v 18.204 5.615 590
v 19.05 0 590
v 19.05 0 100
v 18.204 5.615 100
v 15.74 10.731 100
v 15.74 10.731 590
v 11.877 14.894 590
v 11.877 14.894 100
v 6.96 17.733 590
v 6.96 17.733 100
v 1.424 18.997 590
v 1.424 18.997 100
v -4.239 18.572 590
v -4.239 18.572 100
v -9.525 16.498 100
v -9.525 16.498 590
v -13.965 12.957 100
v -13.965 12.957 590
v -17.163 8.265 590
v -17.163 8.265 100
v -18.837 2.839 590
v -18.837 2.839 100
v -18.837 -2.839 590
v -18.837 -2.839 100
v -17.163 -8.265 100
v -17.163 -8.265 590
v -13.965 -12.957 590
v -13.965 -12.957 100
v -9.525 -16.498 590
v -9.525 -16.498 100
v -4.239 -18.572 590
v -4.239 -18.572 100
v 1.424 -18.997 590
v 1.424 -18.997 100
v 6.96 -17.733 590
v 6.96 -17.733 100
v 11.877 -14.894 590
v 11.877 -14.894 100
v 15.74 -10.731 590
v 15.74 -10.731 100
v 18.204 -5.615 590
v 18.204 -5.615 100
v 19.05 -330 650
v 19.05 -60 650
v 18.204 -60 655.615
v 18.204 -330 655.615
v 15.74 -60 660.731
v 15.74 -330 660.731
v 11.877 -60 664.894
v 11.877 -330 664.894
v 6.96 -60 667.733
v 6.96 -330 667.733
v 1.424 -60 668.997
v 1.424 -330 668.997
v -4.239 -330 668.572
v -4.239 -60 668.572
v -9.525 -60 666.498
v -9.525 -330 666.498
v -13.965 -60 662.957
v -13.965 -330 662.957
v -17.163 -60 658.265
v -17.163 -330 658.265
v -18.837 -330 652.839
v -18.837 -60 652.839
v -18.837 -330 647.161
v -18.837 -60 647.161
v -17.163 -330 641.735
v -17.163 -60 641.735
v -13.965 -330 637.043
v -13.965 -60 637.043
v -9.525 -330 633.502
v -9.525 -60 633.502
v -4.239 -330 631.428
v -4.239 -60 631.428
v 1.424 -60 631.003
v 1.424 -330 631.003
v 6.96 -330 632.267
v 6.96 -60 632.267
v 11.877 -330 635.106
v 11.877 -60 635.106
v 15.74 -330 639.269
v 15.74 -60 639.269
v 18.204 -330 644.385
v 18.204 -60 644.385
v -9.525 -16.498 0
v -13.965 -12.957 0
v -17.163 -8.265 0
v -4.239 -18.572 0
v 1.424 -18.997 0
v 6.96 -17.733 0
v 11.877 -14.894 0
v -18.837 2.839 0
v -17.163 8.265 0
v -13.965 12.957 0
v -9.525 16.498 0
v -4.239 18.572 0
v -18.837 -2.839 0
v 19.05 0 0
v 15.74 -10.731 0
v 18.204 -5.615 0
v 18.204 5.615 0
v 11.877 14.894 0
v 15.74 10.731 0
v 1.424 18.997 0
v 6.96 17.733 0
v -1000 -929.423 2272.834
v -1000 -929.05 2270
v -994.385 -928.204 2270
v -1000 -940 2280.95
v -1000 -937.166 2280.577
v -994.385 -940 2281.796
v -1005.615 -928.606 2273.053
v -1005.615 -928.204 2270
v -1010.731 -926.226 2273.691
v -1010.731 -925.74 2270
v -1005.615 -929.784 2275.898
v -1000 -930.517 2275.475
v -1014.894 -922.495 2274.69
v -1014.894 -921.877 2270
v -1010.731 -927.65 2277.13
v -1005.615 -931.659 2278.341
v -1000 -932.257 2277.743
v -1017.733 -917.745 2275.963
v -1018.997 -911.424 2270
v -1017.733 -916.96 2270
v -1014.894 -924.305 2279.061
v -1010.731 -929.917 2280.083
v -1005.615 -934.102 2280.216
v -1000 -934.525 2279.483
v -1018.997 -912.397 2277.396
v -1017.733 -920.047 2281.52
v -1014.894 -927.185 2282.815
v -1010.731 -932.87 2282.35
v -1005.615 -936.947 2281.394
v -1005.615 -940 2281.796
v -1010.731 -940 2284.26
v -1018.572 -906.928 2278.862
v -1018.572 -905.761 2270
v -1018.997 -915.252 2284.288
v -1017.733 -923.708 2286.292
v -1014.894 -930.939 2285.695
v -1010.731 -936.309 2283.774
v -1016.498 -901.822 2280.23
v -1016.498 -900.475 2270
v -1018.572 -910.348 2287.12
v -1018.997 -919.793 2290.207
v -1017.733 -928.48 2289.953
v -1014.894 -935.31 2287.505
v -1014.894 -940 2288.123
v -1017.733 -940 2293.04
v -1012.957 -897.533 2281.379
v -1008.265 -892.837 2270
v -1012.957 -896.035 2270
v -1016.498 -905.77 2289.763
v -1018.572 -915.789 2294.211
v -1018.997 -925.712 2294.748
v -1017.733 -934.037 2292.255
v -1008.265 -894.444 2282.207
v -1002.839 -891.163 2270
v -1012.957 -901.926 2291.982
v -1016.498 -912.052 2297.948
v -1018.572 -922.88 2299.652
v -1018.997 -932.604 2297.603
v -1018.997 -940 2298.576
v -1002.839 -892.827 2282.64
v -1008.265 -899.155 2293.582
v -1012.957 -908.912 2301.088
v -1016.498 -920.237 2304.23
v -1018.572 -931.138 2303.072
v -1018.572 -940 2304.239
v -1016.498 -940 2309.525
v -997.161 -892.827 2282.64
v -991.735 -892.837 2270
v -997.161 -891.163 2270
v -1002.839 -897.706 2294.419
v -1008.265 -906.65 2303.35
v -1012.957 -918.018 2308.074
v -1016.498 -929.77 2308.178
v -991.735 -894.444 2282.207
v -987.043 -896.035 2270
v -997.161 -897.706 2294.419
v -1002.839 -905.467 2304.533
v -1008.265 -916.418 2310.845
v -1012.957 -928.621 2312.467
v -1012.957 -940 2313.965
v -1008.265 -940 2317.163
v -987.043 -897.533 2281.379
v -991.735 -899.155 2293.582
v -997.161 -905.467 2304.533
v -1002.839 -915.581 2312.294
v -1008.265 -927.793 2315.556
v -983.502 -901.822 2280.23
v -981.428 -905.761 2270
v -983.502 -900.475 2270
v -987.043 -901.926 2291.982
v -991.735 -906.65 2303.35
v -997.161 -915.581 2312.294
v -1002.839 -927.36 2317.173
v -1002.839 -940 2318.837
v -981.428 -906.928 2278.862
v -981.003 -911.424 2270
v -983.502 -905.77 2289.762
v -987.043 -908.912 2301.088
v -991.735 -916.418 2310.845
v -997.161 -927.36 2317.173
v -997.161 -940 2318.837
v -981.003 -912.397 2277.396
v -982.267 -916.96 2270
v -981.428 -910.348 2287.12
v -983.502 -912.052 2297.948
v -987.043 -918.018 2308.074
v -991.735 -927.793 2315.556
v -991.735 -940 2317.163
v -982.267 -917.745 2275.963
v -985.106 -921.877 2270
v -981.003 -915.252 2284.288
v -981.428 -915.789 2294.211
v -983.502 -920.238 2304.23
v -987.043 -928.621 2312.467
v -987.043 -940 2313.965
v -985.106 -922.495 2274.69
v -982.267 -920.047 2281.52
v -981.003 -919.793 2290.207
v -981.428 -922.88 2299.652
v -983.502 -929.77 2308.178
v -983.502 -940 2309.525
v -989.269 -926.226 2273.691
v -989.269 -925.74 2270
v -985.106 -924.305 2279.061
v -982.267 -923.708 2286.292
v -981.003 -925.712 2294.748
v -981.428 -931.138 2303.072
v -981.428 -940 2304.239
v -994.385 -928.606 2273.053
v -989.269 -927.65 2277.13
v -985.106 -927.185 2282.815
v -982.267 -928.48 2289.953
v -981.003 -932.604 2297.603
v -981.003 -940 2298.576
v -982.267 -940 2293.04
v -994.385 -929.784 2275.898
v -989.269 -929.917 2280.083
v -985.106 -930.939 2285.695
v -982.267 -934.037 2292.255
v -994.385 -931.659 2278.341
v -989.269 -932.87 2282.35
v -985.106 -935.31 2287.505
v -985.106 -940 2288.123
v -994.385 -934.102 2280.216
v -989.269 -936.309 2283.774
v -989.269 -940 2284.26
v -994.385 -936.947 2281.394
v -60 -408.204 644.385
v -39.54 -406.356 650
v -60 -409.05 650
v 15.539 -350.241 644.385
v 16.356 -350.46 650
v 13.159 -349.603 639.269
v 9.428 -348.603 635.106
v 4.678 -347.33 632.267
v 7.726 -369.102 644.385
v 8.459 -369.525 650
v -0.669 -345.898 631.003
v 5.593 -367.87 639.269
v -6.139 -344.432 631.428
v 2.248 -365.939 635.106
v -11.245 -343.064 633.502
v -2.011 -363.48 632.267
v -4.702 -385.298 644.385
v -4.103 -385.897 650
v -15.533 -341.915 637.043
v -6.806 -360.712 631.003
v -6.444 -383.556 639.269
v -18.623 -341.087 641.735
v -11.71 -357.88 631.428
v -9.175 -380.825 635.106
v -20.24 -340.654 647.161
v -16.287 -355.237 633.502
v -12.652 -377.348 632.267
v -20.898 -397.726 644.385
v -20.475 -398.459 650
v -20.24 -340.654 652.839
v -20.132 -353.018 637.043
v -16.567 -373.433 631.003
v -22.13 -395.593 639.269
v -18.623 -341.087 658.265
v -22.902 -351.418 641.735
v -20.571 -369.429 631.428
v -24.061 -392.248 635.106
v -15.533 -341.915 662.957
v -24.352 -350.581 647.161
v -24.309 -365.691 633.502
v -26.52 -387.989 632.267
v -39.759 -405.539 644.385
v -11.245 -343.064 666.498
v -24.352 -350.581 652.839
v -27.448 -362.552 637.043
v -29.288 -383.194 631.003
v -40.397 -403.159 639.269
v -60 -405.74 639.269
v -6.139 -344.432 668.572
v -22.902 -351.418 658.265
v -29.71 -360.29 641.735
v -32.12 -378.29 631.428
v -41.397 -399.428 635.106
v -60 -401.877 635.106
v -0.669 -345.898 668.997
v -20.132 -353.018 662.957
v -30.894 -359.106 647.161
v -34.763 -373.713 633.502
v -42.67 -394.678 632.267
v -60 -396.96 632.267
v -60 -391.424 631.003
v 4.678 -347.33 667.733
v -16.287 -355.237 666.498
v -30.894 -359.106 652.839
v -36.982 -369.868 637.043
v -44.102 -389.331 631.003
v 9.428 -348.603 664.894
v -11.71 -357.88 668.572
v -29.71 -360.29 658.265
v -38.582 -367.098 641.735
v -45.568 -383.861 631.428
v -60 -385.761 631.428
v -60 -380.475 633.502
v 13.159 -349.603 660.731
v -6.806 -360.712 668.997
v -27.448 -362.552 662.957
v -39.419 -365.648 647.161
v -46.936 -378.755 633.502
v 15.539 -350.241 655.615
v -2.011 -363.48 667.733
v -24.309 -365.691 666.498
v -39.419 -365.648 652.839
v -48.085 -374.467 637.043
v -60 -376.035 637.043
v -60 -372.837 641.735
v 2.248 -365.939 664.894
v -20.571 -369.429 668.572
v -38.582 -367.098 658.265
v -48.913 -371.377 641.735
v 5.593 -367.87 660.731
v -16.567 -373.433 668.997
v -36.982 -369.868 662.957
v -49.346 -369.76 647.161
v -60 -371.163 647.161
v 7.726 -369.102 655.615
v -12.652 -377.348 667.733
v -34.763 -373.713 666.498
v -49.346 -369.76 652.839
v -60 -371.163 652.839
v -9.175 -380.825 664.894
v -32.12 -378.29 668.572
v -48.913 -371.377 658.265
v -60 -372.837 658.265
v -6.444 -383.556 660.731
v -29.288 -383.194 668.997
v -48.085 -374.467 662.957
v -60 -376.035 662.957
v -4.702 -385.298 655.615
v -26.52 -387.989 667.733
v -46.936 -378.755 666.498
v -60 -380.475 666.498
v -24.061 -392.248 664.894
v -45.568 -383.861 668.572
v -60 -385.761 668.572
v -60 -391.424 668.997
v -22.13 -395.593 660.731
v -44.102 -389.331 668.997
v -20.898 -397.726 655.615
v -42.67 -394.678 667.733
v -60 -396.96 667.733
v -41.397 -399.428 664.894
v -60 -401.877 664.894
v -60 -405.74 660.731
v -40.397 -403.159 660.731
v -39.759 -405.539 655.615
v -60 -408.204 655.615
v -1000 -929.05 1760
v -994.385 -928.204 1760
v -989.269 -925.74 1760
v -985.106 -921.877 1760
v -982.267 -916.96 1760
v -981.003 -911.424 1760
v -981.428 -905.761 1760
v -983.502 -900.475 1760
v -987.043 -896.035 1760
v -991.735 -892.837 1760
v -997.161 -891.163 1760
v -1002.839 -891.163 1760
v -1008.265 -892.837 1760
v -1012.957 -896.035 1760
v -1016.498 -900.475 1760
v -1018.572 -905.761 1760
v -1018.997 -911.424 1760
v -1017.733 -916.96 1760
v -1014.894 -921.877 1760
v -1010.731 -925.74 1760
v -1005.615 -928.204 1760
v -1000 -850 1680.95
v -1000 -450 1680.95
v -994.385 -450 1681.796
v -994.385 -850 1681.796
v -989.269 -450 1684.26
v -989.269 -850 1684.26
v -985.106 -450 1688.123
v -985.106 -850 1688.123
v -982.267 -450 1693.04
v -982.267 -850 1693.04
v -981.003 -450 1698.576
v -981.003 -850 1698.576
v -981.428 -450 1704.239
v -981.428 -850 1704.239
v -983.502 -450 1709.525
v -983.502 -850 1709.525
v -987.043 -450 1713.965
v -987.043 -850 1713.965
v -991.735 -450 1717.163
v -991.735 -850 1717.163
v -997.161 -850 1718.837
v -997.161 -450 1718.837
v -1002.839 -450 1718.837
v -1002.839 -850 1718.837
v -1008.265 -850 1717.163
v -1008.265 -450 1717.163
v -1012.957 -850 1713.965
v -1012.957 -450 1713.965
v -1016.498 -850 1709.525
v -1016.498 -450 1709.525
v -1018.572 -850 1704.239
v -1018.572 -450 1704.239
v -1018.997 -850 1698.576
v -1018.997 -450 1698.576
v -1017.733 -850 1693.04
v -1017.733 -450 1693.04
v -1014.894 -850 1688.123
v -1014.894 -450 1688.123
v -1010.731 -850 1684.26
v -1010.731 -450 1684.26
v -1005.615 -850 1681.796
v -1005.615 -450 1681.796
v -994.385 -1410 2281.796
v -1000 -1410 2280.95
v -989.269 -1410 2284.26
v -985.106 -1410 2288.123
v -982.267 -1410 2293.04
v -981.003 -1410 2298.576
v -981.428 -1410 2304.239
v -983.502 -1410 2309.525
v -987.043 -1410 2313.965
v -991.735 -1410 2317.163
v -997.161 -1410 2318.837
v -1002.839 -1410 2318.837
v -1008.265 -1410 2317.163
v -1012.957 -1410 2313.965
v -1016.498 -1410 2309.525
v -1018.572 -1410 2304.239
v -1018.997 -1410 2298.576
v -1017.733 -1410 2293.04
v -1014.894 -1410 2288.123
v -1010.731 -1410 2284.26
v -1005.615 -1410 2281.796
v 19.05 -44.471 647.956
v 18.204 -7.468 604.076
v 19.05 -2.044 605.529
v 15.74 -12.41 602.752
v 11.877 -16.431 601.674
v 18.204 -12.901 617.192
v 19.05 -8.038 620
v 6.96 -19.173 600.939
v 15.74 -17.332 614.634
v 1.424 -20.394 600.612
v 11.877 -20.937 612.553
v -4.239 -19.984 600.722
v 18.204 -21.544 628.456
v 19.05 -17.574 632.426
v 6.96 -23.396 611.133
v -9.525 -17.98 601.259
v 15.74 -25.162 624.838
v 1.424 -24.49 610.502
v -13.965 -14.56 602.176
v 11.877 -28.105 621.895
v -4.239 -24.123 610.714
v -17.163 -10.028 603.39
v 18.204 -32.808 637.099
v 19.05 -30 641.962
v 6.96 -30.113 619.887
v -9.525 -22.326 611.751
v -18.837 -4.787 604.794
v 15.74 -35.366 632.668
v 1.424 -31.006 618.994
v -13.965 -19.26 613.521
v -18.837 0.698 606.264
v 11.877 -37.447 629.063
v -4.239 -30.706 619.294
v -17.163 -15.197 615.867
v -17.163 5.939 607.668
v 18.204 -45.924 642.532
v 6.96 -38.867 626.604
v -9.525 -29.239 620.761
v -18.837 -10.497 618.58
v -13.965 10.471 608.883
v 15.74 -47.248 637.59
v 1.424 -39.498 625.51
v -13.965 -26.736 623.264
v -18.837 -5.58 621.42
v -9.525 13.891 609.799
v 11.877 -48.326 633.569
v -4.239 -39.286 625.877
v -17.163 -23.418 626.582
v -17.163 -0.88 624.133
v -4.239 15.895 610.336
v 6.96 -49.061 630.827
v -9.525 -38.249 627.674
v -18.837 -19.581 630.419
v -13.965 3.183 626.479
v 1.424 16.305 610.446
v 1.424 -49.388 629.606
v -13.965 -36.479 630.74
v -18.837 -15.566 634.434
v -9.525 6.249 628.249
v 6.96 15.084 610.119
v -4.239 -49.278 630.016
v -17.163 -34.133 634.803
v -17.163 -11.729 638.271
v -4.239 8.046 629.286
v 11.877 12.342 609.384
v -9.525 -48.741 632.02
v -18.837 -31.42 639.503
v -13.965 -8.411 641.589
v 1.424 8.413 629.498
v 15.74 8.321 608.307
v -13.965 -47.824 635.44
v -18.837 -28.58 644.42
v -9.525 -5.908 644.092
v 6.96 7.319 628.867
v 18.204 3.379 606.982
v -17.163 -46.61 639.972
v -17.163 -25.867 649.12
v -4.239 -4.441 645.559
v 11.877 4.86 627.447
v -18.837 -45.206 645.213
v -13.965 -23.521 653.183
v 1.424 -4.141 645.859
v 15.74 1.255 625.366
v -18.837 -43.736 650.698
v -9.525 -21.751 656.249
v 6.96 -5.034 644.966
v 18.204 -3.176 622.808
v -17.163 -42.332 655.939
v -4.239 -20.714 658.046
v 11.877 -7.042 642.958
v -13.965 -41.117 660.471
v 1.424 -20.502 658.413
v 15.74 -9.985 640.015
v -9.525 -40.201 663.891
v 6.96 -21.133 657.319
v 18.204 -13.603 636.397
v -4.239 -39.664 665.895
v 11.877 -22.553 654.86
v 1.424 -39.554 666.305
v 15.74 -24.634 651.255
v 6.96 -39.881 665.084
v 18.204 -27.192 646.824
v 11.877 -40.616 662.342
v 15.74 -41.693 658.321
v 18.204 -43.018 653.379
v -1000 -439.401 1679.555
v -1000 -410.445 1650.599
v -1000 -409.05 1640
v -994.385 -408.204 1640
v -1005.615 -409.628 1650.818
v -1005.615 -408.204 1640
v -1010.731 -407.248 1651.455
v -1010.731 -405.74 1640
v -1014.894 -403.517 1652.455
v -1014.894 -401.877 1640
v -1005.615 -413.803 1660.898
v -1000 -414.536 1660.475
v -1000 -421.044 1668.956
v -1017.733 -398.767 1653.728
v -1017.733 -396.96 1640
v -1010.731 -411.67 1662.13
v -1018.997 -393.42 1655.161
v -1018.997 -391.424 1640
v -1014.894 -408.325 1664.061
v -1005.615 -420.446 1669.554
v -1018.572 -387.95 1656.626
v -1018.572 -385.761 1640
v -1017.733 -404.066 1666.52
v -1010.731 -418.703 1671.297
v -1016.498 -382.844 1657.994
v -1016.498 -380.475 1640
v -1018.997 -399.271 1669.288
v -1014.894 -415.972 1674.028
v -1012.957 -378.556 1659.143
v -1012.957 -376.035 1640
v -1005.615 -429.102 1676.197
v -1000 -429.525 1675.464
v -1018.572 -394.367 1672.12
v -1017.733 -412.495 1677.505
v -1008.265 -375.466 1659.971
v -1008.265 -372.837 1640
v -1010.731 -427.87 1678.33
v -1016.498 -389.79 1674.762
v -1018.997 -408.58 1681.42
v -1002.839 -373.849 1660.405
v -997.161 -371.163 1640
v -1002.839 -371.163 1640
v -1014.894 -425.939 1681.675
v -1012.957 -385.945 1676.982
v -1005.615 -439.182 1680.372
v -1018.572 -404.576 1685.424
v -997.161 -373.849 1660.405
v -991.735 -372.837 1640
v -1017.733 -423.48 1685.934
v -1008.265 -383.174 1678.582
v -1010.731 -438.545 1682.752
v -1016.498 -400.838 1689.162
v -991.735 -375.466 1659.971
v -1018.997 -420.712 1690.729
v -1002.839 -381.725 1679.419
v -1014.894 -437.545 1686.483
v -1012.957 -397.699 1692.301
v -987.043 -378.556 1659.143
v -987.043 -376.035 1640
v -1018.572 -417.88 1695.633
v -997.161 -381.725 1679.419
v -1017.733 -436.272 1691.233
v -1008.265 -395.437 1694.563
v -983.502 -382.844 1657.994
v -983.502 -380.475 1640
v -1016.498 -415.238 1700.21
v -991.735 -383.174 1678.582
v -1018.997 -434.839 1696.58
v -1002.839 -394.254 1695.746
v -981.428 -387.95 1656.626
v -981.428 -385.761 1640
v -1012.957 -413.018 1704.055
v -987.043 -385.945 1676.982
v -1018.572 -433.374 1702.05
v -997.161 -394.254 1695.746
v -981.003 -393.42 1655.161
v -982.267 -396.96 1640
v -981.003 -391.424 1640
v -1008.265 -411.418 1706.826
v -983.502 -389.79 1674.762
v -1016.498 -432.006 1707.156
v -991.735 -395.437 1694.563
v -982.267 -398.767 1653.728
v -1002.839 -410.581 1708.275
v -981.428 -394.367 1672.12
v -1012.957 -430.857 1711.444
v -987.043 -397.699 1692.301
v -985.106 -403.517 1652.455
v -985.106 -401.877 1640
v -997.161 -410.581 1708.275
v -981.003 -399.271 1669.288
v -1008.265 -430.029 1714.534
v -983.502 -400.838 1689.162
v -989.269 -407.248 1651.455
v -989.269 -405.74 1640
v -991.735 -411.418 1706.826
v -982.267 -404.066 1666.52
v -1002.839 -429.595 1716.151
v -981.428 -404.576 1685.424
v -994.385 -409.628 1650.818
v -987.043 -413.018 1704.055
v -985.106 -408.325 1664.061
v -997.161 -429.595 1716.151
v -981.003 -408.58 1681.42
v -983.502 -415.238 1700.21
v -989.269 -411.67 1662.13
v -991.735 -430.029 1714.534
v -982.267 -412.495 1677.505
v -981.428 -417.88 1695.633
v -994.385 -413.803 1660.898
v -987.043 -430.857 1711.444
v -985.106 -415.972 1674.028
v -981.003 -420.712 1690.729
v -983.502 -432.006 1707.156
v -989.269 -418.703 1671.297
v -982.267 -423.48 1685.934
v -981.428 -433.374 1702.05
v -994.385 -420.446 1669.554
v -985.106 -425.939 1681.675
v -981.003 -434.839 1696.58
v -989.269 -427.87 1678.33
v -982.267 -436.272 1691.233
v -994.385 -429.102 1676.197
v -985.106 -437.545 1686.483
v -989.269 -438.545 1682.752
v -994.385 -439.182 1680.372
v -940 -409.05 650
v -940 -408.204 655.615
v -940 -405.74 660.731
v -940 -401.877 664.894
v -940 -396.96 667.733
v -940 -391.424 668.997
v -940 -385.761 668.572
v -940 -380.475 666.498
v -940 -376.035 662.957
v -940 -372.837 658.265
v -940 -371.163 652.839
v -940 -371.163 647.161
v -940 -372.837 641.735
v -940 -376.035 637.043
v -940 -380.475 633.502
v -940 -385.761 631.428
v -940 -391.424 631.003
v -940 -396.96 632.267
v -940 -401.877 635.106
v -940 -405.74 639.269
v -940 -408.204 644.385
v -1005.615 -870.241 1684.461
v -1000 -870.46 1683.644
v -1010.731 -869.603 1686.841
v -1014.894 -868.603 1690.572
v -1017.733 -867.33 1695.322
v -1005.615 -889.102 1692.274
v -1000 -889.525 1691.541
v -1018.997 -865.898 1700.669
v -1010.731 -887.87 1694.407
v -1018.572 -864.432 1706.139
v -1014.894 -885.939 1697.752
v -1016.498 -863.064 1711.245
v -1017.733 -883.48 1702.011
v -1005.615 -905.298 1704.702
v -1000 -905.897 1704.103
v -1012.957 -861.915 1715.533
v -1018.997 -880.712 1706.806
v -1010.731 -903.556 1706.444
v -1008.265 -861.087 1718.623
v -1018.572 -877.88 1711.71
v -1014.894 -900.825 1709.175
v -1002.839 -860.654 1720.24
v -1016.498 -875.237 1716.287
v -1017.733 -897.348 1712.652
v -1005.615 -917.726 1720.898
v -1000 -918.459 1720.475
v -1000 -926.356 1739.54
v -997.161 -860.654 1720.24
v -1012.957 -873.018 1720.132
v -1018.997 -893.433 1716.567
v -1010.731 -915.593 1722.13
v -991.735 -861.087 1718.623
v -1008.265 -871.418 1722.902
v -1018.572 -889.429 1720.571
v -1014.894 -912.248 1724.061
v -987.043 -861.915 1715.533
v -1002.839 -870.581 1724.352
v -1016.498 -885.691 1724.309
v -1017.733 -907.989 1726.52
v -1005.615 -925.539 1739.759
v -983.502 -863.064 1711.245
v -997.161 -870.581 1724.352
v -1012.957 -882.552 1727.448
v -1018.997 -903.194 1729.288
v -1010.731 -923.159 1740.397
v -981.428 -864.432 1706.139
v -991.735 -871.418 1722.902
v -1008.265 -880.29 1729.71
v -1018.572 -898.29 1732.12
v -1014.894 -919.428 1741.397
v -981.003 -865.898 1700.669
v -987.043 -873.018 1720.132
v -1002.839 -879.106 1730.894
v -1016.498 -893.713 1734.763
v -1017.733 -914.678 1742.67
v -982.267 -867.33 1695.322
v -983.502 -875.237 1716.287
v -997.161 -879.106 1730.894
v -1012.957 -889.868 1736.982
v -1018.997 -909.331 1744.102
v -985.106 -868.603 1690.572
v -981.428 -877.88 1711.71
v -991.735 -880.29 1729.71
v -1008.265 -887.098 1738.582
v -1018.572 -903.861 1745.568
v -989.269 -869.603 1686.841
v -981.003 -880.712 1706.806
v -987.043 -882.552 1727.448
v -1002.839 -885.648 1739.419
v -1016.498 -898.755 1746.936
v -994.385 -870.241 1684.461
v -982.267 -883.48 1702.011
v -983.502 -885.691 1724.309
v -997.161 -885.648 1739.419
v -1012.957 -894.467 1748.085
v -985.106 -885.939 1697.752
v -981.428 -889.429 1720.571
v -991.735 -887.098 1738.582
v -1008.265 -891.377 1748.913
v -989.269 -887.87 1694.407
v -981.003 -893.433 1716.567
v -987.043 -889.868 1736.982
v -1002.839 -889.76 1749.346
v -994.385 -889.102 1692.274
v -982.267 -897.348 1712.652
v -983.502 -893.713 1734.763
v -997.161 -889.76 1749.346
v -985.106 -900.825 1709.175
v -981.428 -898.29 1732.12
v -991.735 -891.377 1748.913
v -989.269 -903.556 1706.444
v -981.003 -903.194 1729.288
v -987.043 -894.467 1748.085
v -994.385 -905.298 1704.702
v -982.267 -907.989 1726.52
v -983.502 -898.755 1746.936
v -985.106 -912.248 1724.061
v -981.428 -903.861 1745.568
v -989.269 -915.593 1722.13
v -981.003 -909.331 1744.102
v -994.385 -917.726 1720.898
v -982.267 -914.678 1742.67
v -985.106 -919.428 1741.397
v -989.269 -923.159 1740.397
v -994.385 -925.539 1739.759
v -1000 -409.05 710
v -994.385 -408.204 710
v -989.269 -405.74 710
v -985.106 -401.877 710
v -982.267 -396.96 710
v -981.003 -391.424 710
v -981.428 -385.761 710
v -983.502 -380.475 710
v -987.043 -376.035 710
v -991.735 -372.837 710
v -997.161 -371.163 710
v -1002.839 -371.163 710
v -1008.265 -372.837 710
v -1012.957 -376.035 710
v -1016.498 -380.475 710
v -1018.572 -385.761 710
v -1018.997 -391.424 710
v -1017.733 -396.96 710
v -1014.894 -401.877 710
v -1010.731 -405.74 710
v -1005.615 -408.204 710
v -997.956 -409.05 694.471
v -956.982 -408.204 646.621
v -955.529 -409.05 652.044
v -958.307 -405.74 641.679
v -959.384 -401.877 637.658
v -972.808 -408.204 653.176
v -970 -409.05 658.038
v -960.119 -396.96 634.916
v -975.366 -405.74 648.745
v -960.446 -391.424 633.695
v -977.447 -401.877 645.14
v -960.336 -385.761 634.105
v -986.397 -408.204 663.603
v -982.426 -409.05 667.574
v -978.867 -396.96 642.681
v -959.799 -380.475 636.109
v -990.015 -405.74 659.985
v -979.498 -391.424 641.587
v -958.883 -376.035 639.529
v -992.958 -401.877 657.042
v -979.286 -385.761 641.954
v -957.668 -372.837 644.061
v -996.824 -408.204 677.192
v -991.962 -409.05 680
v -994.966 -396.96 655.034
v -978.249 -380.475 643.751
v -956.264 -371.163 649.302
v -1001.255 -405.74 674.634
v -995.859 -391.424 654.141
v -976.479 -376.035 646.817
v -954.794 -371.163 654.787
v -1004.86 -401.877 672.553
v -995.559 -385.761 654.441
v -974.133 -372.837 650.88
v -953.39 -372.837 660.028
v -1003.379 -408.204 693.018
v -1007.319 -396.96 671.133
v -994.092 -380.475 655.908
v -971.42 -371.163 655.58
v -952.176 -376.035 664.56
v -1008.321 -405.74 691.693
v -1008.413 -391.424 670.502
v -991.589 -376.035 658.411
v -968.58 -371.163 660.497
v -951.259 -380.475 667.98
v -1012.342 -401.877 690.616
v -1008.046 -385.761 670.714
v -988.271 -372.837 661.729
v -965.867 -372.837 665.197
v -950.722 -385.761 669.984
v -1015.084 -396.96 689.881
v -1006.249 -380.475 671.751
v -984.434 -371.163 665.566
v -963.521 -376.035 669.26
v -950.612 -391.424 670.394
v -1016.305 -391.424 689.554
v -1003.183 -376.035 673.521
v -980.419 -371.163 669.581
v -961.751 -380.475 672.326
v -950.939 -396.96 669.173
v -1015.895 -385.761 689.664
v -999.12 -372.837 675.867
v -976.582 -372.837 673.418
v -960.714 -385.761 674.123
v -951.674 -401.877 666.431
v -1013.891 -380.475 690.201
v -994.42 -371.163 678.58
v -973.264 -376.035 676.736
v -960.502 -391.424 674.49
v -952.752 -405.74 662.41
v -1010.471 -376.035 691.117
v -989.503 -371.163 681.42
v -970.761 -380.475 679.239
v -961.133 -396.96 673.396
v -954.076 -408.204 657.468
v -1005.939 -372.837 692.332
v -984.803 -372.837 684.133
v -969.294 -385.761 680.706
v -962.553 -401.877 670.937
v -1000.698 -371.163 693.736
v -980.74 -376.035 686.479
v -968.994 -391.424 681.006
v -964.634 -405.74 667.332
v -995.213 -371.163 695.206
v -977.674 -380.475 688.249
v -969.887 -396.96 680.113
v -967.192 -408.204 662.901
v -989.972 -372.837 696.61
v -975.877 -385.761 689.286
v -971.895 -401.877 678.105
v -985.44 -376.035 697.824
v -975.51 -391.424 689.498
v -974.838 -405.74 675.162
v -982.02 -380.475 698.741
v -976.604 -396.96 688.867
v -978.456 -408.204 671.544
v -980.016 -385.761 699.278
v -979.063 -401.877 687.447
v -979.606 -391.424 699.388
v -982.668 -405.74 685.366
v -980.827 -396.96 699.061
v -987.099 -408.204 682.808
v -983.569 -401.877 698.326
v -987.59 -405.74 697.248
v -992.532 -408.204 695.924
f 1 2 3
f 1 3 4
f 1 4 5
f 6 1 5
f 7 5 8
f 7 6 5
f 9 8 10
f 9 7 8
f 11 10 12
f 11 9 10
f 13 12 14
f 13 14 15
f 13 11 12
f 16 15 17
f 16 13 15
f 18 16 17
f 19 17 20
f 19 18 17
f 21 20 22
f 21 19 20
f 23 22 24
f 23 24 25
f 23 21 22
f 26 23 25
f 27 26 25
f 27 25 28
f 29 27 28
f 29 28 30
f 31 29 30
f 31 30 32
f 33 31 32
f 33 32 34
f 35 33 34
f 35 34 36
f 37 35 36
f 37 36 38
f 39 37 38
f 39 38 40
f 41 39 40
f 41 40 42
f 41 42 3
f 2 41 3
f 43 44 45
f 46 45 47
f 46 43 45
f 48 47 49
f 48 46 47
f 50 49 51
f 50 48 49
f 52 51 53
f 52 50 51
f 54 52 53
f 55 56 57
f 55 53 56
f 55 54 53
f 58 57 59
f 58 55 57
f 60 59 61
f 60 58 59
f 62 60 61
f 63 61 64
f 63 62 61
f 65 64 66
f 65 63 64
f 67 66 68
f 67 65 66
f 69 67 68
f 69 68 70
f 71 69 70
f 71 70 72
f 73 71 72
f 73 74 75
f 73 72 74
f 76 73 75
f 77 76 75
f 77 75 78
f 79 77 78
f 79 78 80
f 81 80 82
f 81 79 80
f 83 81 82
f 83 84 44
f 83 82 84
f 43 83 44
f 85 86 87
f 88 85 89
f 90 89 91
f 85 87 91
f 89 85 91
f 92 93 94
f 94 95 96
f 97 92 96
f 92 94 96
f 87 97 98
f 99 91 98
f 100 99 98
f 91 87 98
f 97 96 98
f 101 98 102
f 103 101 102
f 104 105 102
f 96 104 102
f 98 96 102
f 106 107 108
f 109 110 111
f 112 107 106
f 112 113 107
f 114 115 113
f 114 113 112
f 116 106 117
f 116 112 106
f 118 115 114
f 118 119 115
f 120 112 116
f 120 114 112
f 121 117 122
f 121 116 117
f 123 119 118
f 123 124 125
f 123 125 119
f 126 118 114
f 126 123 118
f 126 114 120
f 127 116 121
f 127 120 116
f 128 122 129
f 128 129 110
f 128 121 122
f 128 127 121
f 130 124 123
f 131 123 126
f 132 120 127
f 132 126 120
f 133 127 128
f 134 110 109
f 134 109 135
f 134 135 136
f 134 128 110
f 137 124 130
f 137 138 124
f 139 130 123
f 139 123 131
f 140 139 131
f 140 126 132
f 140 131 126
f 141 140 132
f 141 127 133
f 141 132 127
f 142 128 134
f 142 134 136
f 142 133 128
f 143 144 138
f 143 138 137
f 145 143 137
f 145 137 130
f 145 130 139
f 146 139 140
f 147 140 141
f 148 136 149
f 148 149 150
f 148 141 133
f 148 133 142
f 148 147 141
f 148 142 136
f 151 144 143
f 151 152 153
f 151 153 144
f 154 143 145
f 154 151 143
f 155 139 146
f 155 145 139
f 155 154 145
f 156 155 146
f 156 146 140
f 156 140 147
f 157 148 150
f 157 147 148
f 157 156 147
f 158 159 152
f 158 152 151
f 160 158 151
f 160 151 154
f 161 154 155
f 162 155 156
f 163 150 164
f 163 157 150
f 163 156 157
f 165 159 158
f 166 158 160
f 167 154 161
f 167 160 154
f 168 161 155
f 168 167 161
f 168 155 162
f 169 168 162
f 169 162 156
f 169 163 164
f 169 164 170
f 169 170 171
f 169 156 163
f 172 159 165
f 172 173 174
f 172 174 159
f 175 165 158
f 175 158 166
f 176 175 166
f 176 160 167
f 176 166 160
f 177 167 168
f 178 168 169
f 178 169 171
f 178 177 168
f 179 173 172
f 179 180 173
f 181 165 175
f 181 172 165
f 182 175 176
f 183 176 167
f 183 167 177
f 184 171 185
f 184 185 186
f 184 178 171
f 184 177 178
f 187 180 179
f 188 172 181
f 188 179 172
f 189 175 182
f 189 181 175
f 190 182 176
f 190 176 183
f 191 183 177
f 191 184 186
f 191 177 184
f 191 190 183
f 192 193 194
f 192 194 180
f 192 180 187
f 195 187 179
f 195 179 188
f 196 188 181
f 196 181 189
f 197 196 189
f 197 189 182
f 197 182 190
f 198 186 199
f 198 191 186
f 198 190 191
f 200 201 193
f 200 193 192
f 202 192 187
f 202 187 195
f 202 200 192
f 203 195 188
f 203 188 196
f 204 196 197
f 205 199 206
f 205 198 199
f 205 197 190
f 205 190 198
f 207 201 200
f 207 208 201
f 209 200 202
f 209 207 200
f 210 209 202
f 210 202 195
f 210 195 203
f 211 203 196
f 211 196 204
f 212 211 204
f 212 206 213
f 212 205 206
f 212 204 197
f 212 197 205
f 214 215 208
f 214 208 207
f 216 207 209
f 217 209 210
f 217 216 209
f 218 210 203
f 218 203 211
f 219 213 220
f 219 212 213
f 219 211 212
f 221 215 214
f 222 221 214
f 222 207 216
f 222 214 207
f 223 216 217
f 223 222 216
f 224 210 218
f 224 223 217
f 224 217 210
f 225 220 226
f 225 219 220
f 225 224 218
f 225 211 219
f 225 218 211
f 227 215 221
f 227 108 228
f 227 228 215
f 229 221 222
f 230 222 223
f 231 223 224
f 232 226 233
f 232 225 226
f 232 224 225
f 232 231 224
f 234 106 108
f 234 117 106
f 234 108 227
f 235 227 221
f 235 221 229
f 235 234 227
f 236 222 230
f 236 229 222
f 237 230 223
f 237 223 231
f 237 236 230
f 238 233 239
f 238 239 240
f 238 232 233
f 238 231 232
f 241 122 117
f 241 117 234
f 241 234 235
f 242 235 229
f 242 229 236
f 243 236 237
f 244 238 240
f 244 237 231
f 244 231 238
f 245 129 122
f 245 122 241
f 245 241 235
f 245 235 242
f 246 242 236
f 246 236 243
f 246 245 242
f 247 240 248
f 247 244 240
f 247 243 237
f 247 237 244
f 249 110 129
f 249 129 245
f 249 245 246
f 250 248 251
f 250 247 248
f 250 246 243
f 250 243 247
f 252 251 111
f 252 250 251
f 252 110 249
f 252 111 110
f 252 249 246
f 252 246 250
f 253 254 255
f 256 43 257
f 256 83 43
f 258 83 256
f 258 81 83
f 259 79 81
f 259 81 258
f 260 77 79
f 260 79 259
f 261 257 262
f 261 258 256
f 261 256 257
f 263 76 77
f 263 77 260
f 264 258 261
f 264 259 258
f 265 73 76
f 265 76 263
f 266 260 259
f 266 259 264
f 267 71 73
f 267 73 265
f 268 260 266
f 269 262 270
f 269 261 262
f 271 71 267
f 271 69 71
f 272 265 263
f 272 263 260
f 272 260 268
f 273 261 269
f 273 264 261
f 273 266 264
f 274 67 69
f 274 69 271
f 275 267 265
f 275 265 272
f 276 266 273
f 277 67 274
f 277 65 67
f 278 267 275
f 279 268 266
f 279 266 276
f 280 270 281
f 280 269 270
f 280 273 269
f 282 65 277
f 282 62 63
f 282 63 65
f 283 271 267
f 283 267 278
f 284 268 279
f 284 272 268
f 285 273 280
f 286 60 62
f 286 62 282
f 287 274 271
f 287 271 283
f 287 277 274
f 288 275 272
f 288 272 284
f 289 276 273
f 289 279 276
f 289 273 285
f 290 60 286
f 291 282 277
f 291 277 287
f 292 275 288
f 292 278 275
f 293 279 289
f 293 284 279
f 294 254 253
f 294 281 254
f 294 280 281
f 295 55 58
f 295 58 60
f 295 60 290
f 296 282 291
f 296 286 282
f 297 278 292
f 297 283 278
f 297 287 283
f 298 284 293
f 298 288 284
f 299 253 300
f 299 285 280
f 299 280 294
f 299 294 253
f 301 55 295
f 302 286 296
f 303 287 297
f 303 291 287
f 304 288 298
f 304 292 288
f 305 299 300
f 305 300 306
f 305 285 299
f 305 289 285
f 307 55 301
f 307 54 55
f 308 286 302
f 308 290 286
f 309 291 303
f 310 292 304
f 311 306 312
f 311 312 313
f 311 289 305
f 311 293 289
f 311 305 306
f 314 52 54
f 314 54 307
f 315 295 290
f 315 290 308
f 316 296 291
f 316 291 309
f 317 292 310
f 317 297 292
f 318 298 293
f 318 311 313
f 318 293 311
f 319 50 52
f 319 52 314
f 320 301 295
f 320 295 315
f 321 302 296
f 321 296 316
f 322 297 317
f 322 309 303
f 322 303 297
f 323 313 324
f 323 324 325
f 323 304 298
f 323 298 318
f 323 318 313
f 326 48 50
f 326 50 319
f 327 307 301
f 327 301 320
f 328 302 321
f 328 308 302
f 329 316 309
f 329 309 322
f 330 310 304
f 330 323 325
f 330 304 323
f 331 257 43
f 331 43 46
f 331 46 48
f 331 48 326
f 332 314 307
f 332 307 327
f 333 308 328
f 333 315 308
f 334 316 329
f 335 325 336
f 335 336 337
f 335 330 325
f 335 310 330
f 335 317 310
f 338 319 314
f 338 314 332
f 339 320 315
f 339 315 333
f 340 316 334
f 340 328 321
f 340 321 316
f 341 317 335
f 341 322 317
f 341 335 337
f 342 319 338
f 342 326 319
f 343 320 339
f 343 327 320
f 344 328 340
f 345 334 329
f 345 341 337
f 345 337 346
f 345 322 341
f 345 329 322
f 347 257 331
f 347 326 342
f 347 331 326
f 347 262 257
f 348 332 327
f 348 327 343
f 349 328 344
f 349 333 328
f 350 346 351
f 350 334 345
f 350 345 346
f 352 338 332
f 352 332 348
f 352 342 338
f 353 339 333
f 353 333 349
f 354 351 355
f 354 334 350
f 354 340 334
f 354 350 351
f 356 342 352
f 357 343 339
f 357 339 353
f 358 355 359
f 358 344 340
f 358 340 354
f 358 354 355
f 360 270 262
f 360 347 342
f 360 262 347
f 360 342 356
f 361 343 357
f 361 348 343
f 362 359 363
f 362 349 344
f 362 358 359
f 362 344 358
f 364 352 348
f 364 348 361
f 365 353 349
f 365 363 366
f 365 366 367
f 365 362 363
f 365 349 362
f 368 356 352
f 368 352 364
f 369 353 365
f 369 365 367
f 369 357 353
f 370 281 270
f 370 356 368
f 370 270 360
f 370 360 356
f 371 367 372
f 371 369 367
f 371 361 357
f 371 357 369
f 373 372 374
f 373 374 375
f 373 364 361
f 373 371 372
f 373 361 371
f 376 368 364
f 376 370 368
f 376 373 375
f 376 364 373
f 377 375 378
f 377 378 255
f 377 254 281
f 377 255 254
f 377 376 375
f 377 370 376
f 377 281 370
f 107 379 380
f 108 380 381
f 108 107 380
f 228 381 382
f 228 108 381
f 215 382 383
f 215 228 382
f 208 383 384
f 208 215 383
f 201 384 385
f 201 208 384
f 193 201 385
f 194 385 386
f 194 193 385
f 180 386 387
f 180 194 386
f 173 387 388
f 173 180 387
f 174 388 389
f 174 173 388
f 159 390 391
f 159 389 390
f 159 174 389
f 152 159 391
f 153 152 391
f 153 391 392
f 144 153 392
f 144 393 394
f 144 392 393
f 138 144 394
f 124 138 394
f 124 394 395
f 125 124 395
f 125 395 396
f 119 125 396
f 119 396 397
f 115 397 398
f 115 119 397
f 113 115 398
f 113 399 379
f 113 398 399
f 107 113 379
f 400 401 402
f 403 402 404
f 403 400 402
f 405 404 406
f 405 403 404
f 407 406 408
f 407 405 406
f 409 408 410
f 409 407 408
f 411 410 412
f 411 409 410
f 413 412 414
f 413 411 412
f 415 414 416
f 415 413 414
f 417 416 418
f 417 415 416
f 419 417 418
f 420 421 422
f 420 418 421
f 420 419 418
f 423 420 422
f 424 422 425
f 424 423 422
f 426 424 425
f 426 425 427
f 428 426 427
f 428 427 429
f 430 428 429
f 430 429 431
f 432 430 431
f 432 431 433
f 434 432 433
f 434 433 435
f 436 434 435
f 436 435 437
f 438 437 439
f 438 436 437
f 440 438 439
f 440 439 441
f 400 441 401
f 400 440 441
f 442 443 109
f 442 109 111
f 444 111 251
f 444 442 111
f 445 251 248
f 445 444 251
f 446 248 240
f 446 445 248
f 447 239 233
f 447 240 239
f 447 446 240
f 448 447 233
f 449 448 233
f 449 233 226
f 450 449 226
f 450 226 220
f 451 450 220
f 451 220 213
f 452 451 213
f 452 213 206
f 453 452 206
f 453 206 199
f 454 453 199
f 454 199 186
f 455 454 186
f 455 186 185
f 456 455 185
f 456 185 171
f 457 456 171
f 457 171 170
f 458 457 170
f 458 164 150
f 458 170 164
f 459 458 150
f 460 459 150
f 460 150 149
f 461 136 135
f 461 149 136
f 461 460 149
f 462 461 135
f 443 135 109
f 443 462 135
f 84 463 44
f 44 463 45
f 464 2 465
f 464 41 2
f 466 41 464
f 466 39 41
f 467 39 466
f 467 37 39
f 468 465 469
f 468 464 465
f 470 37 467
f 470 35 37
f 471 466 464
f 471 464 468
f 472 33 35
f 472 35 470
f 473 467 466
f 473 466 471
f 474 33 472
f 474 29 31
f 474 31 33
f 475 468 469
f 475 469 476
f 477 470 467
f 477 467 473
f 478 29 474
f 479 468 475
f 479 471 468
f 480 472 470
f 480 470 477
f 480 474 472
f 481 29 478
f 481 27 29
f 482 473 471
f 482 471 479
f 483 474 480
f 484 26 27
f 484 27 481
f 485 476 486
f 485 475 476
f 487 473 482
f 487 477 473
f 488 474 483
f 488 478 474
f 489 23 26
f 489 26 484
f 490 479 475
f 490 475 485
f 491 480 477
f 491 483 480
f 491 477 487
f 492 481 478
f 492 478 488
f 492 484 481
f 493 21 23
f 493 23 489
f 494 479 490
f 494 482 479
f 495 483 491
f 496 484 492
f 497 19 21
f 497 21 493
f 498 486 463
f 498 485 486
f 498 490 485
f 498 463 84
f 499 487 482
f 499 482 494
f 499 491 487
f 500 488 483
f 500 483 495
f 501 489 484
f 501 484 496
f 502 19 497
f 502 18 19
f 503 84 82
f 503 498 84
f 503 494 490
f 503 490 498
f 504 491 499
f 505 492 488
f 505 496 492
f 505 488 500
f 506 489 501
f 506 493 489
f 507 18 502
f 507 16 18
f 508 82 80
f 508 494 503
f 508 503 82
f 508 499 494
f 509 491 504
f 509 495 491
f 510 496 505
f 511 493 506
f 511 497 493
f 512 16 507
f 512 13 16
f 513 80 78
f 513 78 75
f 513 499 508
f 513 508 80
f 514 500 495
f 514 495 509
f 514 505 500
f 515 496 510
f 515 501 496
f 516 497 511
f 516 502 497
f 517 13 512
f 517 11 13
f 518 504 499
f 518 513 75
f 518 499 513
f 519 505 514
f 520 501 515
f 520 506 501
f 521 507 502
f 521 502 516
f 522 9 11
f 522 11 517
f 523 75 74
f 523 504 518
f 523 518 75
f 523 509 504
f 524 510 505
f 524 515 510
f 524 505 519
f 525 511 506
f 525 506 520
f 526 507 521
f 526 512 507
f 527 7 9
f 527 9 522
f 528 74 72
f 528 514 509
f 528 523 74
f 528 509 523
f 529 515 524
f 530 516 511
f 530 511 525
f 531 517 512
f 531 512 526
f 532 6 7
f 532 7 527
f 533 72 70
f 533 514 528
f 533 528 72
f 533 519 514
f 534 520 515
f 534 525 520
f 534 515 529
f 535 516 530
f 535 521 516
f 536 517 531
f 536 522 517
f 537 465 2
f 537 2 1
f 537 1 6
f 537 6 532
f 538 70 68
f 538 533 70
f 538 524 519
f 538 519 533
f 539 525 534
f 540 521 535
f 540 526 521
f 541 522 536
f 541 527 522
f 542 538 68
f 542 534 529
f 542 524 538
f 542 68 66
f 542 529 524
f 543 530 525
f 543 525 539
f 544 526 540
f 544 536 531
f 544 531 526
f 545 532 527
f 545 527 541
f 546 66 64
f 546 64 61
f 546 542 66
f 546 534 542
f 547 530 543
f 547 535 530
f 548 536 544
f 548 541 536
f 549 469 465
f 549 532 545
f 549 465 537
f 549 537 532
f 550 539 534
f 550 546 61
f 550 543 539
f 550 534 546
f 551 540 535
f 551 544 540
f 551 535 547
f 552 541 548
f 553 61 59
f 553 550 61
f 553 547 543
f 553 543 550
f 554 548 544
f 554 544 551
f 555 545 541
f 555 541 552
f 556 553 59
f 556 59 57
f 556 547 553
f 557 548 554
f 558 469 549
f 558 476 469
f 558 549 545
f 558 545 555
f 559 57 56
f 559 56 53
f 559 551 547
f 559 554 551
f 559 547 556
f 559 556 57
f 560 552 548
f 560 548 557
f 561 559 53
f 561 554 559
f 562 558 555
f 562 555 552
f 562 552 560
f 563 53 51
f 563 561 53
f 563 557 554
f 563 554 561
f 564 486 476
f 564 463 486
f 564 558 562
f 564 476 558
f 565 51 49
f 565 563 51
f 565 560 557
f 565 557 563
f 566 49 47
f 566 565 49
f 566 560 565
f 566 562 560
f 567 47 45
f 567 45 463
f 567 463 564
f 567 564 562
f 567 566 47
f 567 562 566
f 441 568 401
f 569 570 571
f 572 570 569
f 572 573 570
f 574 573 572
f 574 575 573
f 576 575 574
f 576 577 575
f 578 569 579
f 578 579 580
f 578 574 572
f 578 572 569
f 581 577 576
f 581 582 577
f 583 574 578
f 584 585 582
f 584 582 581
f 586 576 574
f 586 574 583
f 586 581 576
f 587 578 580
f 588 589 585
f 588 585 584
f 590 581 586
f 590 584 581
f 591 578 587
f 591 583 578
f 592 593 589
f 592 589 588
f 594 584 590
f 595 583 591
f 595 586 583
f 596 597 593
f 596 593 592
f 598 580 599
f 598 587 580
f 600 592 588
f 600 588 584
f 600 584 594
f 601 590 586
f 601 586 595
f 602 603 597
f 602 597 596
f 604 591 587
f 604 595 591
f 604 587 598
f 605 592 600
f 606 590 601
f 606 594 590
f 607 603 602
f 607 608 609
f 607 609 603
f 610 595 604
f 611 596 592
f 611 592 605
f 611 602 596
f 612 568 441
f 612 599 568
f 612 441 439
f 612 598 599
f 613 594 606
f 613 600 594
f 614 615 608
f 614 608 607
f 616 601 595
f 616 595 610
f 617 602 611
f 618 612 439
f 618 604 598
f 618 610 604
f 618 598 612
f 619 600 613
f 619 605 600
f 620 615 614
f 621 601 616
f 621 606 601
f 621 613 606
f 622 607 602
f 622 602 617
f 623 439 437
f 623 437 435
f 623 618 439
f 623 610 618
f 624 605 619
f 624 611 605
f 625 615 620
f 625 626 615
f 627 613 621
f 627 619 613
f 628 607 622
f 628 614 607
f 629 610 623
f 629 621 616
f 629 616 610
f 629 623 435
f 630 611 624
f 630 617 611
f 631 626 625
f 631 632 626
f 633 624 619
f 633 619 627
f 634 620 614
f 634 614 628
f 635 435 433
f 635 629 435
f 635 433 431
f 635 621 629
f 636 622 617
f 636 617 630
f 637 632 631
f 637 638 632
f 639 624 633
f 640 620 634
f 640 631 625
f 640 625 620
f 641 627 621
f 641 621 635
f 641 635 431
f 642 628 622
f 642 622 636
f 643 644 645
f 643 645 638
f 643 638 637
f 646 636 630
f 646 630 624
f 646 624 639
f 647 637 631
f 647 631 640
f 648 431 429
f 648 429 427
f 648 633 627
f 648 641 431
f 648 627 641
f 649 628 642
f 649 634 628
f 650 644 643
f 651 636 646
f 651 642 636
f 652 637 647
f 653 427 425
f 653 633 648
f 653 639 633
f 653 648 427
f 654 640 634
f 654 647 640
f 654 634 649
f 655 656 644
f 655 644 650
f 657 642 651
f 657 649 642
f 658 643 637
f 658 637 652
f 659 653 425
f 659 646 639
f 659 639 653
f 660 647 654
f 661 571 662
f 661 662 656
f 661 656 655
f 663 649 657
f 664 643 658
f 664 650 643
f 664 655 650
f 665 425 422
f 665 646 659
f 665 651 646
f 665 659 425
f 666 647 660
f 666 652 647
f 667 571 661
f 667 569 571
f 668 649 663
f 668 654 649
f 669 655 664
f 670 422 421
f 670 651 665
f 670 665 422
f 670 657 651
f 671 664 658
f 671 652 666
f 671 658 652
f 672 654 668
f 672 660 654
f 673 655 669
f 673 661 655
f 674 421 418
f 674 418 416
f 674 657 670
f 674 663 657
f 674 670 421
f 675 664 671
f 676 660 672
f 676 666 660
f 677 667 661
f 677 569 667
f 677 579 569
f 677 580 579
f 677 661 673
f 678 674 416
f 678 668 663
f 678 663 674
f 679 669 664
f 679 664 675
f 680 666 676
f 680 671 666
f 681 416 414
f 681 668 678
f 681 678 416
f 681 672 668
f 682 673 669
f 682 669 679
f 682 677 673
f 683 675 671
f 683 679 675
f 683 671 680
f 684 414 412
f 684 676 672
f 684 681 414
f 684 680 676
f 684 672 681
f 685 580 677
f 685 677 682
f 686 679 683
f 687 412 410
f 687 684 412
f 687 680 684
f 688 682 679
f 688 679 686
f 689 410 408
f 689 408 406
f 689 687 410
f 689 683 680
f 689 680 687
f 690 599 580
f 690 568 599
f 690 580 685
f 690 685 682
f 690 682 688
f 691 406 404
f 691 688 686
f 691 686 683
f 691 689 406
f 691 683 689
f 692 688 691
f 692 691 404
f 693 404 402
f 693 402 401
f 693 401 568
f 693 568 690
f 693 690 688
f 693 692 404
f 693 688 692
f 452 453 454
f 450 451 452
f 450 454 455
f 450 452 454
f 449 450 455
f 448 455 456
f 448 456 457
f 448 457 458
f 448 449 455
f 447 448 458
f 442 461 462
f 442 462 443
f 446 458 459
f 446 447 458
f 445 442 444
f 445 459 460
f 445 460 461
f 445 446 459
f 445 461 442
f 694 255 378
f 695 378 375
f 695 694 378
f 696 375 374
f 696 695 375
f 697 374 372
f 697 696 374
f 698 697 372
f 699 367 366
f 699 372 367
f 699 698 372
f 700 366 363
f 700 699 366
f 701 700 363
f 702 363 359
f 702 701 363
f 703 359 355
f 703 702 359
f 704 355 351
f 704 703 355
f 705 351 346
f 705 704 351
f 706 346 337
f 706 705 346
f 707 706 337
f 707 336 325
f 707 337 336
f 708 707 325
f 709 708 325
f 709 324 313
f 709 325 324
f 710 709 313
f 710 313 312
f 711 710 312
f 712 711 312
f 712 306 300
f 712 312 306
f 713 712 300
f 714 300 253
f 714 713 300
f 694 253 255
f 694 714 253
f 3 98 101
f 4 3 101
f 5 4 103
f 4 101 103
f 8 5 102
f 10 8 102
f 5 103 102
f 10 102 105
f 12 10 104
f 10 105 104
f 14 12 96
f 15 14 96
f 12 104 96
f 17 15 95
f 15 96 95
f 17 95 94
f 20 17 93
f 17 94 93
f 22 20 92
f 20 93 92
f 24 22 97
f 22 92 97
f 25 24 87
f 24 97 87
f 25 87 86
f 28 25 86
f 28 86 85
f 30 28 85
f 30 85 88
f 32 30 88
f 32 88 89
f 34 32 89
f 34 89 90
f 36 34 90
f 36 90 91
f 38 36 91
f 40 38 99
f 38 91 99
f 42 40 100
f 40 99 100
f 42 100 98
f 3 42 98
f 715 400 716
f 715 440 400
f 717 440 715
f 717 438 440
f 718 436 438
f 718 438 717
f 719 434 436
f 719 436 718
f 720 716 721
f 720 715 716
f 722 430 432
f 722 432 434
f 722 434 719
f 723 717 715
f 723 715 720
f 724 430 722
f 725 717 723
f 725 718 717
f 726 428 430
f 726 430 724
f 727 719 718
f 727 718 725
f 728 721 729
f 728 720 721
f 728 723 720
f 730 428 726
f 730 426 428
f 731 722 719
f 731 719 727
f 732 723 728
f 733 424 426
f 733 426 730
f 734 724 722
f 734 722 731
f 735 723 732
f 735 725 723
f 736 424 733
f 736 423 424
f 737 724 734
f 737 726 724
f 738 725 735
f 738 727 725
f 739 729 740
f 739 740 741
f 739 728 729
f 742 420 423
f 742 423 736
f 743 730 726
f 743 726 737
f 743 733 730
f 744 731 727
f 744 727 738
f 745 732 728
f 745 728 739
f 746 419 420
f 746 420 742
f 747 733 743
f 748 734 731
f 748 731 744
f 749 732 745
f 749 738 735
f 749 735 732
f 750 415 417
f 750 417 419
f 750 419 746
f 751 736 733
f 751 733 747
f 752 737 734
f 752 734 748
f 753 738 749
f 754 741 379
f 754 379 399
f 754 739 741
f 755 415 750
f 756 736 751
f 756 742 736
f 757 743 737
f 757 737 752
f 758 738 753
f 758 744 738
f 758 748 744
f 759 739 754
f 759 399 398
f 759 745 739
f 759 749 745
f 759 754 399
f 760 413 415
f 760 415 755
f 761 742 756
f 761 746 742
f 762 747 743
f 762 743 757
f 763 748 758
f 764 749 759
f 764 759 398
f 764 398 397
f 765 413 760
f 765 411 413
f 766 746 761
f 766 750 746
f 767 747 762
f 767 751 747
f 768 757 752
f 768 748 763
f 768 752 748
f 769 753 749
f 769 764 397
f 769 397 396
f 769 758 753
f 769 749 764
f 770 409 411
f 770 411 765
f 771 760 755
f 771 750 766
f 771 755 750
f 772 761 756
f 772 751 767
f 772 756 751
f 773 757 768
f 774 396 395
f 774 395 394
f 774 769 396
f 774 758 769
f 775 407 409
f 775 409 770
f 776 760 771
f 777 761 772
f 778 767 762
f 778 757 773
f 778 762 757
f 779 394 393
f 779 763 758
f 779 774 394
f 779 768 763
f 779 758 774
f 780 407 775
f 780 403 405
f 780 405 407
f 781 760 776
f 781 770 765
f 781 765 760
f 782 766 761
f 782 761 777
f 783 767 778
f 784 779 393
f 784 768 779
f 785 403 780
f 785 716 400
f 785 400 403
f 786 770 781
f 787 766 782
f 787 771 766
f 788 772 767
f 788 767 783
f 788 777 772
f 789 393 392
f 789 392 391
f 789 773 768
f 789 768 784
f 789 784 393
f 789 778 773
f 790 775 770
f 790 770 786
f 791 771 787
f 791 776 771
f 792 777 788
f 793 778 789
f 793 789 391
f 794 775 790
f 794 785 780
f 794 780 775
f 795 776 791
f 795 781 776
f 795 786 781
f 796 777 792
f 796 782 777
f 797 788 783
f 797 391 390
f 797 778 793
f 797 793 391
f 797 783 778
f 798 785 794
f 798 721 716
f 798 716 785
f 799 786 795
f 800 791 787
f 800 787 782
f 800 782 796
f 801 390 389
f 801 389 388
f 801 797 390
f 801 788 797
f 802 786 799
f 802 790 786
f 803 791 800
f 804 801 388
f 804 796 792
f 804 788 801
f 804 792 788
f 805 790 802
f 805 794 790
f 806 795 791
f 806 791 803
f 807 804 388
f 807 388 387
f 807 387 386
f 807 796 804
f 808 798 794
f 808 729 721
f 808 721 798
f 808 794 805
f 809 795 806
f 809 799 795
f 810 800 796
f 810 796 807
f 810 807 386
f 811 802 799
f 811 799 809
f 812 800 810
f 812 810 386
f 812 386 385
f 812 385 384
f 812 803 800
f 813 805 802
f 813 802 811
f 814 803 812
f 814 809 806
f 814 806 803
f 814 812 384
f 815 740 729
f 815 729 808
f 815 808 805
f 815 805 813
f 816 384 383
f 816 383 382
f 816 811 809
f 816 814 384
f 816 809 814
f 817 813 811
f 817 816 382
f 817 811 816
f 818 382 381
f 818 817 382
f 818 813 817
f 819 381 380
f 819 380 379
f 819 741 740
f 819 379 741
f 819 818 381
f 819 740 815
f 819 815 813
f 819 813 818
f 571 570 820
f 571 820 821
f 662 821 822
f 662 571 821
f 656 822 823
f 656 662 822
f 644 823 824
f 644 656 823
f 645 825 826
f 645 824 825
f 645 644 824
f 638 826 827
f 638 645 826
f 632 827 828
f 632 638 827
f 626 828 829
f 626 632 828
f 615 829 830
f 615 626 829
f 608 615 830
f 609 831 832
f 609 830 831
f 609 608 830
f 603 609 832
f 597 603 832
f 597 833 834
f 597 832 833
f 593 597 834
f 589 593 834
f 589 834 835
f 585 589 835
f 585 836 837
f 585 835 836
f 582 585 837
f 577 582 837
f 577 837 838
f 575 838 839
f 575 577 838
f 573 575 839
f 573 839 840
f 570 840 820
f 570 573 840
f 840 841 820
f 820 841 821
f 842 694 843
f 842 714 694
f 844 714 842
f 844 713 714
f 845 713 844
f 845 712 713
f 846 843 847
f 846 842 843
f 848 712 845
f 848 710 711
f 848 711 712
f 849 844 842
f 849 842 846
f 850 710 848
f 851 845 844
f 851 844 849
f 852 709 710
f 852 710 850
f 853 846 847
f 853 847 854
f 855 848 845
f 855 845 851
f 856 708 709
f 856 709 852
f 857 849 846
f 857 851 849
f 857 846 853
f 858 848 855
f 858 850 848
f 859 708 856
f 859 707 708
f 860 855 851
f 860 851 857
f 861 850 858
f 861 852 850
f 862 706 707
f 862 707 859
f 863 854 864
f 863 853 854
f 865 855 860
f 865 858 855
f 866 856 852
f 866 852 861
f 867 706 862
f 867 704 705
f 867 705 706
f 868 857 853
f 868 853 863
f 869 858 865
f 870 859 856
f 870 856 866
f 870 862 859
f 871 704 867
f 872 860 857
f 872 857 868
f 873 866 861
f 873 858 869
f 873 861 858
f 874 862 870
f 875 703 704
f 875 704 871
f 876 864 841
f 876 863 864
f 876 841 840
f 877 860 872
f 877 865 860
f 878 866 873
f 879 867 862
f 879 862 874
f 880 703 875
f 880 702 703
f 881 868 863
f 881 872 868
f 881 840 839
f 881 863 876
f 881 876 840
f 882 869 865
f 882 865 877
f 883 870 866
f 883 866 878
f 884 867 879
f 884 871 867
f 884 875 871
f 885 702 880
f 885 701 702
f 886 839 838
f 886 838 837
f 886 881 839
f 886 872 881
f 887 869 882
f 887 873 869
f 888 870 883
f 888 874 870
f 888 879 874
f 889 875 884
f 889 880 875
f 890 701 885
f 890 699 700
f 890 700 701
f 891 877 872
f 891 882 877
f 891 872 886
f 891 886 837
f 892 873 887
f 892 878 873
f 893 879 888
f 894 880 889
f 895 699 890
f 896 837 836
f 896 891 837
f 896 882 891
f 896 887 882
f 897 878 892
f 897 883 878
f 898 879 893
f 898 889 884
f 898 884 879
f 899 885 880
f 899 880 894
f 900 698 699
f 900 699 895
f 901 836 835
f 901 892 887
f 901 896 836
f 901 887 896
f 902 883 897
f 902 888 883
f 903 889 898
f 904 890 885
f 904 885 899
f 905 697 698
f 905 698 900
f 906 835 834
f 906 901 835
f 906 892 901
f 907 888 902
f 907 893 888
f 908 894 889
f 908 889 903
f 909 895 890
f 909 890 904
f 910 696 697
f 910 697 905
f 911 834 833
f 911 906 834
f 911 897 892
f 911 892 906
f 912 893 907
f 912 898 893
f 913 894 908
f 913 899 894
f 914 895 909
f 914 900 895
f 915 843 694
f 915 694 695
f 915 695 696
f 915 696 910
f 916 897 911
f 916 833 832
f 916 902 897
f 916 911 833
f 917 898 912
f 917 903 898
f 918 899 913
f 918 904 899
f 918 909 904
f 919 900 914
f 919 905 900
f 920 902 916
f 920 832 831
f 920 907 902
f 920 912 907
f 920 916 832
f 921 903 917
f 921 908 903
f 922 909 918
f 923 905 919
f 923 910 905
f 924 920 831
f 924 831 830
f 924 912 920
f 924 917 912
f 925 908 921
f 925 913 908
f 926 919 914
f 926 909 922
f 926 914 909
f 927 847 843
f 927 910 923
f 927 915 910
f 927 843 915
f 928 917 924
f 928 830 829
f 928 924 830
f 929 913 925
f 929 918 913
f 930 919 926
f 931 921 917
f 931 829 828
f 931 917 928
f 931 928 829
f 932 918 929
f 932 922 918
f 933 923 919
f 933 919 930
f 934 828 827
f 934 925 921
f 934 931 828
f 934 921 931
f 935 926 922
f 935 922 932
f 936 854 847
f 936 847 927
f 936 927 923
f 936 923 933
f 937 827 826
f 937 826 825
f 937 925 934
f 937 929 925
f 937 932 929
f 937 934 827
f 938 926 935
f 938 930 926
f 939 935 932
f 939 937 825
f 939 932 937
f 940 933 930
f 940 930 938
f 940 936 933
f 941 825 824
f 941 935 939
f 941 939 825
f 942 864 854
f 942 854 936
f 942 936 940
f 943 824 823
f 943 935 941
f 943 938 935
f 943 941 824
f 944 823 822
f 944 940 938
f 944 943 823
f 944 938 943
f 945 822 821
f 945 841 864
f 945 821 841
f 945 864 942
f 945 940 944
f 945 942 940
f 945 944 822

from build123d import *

# Parameters (mm, degrees)
CROQUIS1_R              = 19.05
SALIENTE_EXTRUIR1_DEPTH = 100
CROQUIS2_R              = 19.05


with BuildPart() as part:
    # Croquis1 → Saliente-Extruir1 (new body)
    with BuildSketch(Plane.XY):
        Circle(CROQUIS1_R)
    extrude(amount=SALIENTE_EXTRUIR1_DEPTH)

    # Barrer1: sweep along a curve in space
    with BuildLine() as barrer1_path:
        Line((0, 0, 100), (0, 0, 590))
        ThreePointArc((0, 0, 590), (0, -17.573593129, 632.426406871), (0, -60, 650))
        Line((0, -60, 650), (0, -330, 650))
        ThreePointArc((0, -330, 650), (-17.573593129, -372.426406871, 650), (-60, -390, 650))
        Line((-60, -390, 650), (-940, -390, 650))
        ThreePointArc((-940, -390, 650), (-982.426406871, -390, 667.573593129), (-1000, -390, 710))
        Line((-1000, -390, 710), (-1000, -390, 1640))
        ThreePointArc((-1000, -390, 1640), (-1000, -407.573593129, 1682.426406871), (-1000, -450, 1700))
        Line((-1000, -450, 1700), (-1000, -850, 1700))
        ThreePointArc((-1000, -850, 1700), (-1000, -892.426406871, 1717.573593129), (-1000, -910, 1760))
        Line((-1000, -910, 1760), (-1000, -910, 2270))
        ThreePointArc((-1000, -910, 2270), (-1000, -918.786796564, 2291.213203436), (-1000, -940, 2300))
        Line((-1000, -940, 2300), (-1000, -1410, 2300))
    # Croquis2 → Barrer1 (sweep)
    with BuildSketch(Plane.XY.offset(100)):
        Circle(CROQUIS2_R)
    sweep(path=barrer1_path.line)


solid = part.part
